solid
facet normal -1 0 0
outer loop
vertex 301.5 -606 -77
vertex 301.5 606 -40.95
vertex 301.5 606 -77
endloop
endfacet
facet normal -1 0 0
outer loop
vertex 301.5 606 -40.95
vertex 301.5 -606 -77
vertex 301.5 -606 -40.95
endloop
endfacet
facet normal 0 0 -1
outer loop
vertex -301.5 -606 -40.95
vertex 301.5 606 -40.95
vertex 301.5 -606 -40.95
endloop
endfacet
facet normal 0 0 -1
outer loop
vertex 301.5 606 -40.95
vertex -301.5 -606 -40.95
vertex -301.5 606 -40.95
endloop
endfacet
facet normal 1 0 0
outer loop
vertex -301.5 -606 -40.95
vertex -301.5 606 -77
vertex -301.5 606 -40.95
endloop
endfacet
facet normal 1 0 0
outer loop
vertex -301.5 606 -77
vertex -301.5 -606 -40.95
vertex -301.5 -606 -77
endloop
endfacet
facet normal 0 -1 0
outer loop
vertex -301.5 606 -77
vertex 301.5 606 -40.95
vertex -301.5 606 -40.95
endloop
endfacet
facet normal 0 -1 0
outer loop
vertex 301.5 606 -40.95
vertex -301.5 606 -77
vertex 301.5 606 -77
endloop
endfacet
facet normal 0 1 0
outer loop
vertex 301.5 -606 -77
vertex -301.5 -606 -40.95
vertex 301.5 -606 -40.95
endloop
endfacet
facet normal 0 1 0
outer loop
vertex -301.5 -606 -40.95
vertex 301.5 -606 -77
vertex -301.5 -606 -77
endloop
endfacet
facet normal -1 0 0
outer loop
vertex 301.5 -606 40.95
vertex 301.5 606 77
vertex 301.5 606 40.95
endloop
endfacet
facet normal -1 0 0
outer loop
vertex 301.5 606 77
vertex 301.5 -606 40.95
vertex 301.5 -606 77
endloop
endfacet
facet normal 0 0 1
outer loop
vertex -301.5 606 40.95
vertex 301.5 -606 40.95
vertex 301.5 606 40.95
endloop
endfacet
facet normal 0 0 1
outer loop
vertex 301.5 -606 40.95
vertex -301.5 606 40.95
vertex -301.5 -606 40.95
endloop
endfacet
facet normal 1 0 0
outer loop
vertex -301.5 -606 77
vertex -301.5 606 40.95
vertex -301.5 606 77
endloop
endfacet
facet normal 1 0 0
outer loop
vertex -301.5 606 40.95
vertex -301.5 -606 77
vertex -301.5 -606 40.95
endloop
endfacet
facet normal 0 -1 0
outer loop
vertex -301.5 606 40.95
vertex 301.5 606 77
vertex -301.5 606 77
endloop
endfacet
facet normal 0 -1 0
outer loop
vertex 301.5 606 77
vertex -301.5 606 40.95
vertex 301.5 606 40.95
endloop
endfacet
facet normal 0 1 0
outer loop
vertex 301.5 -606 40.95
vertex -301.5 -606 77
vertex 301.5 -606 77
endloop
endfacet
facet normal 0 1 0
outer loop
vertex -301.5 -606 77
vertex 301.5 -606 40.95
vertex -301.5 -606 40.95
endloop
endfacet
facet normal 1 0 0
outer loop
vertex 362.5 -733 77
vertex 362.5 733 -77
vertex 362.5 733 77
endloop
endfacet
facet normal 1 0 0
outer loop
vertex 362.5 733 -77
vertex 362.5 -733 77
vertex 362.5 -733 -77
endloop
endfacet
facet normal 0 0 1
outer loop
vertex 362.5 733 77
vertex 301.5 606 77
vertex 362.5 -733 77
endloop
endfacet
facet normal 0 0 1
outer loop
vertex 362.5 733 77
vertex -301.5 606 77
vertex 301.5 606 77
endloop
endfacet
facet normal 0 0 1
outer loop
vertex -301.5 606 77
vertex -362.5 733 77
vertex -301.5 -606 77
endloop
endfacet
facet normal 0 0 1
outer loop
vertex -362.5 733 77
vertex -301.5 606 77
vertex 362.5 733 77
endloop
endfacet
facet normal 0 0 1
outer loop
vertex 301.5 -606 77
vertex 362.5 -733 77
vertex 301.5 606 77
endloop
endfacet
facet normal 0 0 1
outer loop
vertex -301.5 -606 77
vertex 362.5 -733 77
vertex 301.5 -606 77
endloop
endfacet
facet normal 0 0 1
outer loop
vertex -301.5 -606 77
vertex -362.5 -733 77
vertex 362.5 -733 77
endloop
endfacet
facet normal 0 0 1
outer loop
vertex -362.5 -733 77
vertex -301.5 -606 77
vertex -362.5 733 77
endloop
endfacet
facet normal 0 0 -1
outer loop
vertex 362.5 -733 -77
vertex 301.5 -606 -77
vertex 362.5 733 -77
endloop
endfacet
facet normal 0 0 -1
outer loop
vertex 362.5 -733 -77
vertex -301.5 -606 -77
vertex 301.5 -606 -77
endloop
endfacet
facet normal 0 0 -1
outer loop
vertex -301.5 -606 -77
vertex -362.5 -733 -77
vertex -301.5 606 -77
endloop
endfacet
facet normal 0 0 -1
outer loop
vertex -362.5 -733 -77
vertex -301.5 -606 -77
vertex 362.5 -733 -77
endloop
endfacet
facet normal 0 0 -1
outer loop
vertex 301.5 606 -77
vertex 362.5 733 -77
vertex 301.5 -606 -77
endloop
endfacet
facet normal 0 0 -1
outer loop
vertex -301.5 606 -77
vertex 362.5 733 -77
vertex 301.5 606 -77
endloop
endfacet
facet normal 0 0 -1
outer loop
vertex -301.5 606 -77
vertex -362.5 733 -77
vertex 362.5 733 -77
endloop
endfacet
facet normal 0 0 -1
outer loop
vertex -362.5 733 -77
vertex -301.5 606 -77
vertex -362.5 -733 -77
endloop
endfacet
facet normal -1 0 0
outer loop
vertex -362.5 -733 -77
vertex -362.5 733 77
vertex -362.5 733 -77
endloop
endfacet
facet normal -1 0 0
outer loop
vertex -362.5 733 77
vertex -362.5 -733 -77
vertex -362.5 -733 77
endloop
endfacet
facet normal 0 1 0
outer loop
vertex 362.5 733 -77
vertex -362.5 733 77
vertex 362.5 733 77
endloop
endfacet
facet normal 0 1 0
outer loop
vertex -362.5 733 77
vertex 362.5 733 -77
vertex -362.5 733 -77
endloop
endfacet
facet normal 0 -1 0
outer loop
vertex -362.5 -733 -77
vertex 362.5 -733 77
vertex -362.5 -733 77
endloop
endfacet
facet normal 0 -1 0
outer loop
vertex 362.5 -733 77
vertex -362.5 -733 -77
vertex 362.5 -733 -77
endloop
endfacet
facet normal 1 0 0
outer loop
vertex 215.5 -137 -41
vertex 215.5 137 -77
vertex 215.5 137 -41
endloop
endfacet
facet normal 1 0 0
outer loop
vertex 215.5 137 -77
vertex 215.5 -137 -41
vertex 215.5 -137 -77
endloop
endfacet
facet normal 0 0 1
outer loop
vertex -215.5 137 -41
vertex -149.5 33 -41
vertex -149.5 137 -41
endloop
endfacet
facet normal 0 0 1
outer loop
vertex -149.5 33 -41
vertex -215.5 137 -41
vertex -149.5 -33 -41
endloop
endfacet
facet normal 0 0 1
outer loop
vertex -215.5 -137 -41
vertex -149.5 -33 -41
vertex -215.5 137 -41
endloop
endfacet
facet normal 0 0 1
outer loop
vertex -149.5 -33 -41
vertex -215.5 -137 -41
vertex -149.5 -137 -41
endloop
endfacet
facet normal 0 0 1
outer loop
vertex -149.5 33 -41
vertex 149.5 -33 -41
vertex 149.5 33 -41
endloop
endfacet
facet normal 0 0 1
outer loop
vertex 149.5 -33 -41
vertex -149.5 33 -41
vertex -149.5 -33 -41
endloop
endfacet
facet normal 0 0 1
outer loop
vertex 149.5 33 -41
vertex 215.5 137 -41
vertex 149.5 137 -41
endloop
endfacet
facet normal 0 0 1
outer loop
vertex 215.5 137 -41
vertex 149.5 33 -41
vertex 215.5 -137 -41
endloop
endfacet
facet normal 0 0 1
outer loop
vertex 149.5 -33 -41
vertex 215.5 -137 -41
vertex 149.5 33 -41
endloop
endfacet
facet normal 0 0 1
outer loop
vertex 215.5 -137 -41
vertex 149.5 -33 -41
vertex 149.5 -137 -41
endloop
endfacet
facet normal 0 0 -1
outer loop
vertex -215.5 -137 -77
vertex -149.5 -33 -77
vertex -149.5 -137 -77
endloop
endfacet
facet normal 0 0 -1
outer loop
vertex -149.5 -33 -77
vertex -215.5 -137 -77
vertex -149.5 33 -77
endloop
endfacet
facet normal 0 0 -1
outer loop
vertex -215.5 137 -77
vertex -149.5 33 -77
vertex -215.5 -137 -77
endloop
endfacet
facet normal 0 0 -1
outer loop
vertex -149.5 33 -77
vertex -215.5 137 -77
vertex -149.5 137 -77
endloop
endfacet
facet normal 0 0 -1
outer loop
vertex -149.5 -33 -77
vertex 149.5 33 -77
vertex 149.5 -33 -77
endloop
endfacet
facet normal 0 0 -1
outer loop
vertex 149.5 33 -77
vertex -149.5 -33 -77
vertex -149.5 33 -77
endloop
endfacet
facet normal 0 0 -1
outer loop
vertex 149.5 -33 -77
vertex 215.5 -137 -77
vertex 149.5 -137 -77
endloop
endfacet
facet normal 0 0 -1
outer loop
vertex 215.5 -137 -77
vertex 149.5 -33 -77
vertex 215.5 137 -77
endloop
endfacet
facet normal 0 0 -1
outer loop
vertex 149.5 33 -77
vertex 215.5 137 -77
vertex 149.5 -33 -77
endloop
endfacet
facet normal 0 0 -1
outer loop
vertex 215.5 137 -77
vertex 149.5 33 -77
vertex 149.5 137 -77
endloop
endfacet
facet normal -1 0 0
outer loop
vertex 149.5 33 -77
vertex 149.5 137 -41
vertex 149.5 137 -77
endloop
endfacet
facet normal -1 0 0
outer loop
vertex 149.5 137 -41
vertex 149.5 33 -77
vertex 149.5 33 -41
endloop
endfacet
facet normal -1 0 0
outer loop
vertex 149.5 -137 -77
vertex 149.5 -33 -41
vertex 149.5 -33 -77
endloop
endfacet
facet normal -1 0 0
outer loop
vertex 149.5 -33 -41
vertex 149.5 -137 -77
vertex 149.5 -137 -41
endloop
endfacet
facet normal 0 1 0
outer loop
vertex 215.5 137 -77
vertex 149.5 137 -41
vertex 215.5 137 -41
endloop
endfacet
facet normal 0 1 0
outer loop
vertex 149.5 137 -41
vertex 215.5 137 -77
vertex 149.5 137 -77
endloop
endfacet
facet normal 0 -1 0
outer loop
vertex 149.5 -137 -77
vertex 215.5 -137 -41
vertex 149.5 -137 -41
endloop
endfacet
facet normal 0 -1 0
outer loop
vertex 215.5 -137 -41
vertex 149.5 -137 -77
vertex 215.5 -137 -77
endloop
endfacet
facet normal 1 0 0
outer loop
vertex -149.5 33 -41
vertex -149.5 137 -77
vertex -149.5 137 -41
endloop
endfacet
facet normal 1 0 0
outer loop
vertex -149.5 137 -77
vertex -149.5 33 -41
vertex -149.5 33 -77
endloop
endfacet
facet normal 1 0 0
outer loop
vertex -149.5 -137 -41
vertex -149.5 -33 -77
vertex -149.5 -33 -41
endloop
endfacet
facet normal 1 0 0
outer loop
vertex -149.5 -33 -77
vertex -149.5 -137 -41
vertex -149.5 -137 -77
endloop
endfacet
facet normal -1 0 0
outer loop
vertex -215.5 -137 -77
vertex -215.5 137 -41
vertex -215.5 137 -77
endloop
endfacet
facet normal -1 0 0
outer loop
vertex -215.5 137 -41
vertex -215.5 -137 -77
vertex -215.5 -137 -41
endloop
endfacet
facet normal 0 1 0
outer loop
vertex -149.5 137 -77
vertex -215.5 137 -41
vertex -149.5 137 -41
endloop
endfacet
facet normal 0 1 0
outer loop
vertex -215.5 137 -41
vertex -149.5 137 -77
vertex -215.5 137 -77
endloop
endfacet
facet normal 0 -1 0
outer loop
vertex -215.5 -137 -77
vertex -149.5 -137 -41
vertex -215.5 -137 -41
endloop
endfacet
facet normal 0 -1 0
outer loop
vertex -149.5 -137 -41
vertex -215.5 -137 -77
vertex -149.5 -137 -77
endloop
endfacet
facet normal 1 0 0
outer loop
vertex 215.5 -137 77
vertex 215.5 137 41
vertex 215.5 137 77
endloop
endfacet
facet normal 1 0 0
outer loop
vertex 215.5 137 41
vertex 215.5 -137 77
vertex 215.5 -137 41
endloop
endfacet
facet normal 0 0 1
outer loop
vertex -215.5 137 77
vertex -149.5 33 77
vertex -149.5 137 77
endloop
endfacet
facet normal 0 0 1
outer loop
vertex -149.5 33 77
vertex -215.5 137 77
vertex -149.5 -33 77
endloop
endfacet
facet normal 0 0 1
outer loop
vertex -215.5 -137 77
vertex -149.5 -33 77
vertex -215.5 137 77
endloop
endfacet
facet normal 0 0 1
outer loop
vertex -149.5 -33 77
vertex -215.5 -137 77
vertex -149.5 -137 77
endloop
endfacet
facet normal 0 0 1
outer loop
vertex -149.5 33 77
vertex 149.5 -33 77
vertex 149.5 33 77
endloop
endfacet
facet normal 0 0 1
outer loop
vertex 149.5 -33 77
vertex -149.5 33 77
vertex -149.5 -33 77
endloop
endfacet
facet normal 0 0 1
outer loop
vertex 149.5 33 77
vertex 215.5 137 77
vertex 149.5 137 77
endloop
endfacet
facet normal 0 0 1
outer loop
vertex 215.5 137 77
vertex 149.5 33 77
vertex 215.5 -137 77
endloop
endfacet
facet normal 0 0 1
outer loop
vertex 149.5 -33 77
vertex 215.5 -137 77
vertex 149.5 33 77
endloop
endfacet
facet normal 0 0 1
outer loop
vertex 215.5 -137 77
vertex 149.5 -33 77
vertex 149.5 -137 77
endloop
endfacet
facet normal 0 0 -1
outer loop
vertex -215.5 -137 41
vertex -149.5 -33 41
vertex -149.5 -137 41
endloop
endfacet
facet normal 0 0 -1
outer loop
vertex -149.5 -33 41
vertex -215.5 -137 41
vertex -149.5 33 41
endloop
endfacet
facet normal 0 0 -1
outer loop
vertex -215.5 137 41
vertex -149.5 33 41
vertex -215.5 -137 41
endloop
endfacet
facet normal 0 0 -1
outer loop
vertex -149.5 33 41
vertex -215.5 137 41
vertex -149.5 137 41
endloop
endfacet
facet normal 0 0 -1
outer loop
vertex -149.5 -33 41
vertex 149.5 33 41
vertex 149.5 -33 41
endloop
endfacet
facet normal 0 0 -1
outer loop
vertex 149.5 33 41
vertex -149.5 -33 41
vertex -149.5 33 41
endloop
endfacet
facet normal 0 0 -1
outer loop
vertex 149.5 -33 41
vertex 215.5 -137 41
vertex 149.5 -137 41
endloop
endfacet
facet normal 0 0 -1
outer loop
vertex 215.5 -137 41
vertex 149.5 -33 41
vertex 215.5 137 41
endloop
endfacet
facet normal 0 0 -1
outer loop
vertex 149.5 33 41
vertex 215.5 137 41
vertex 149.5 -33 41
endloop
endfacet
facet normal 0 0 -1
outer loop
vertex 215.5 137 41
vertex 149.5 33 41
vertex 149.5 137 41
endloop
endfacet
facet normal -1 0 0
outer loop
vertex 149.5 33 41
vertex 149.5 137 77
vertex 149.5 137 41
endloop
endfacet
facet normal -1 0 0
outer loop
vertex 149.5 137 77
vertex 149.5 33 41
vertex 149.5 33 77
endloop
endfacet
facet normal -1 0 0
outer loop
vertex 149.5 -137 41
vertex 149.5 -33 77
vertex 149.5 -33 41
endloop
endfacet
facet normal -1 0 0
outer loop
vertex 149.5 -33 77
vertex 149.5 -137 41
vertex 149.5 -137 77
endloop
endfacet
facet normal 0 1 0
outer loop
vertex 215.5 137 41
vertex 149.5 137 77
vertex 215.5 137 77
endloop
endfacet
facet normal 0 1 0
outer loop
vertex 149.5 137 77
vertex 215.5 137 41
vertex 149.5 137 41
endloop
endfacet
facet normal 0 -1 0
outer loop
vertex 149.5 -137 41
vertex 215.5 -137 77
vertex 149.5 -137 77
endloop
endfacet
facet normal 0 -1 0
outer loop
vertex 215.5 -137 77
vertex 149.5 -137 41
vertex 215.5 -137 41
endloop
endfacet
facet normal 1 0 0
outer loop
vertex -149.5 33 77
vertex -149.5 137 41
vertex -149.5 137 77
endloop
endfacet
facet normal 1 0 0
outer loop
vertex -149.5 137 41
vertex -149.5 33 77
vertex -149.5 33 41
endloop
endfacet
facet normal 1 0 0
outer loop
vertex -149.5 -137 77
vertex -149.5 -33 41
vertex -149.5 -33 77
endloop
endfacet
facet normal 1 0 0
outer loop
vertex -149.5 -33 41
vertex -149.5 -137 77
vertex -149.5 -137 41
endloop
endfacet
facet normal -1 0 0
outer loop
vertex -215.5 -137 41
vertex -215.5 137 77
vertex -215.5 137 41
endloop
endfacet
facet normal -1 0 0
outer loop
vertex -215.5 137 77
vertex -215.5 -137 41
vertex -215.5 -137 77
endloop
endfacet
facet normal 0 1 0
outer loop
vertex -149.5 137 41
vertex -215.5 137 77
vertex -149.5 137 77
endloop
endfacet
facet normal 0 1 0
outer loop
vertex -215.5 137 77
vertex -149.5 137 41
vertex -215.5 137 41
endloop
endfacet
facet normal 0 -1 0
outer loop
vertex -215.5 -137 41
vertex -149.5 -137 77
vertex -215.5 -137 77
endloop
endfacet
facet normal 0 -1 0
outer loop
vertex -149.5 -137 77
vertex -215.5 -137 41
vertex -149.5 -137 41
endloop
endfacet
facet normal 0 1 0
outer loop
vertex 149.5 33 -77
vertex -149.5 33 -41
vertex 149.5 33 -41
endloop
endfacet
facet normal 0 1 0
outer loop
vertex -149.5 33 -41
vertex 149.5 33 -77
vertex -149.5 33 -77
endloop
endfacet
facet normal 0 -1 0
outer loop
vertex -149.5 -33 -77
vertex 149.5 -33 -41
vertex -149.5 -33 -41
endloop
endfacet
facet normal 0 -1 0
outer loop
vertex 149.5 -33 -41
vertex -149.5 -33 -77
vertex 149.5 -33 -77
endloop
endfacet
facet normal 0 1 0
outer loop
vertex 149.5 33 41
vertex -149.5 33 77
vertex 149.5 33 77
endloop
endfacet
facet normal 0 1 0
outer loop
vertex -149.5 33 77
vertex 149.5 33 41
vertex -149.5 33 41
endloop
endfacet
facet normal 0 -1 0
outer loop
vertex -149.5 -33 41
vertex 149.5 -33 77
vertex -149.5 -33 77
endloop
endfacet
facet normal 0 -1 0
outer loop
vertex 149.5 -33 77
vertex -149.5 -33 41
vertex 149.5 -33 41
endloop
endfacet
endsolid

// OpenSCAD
// Box dimensions
box_width = 725;
box_depth = 1466;
box_height = 154;

// Recess parameters
recess_depth = 36;
bezel_width_x = 61;
bezel_width_y = 127;

// Calculated recess dimensions
recess_width = box_width - (2 * bezel_width_x);
recess_depth_y = box_depth - (2 * bezel_width_y);

// Protruding box parameters
protrude_width = 66;
protrude_depth = 274;
protrude_height = 36;
protrude_x_offset = (recess_width/2) - 86 - (protrude_width/2); // 86 units from end of recess

// Second protruding box parameters (maximum width with 86 clearance)
protrude2_width = recess_width - (2 * 86); // Maximum width leaving 86 on each side
protrude2_depth = 66;
protrude2_height = 36;

union() {
    difference() {
        // Main box
        cube([box_width, box_depth, box_height], center=true);
        
        // Recess cutouts on top and bottom using a loop
        for (z_pos = [-(box_height - recess_depth) / 2, (box_height - recess_depth) / 2]) {
            translate([0, 0, z_pos]) {
                cube([recess_width, recess_depth_y, recess_depth + 0.1], center=true);
            }
        }
    }
    
    // Protruding boxes on both sides of top and bottom recess areas
    for (z_pos = [-(box_height - recess_depth) / 2, (box_height - recess_depth) / 2]) {
        for (x_pos = [protrude_x_offset, -protrude_x_offset]) {
            translate([x_pos, 0, z_pos]) {
                cube([protrude_width, protrude_depth, protrude_height], center=true);
            }
        }
    }
    
    // Second protruding box spanning maximum width on top and bottom recess areas
    for (z_pos = [-(box_height - recess_depth) / 2, (box_height - recess_depth) / 2]) {
        translate([0, 0, z_pos]) {
            cube([protrude2_width, protrude2_depth, protrude2_height], center=true);
        }
    }
}
